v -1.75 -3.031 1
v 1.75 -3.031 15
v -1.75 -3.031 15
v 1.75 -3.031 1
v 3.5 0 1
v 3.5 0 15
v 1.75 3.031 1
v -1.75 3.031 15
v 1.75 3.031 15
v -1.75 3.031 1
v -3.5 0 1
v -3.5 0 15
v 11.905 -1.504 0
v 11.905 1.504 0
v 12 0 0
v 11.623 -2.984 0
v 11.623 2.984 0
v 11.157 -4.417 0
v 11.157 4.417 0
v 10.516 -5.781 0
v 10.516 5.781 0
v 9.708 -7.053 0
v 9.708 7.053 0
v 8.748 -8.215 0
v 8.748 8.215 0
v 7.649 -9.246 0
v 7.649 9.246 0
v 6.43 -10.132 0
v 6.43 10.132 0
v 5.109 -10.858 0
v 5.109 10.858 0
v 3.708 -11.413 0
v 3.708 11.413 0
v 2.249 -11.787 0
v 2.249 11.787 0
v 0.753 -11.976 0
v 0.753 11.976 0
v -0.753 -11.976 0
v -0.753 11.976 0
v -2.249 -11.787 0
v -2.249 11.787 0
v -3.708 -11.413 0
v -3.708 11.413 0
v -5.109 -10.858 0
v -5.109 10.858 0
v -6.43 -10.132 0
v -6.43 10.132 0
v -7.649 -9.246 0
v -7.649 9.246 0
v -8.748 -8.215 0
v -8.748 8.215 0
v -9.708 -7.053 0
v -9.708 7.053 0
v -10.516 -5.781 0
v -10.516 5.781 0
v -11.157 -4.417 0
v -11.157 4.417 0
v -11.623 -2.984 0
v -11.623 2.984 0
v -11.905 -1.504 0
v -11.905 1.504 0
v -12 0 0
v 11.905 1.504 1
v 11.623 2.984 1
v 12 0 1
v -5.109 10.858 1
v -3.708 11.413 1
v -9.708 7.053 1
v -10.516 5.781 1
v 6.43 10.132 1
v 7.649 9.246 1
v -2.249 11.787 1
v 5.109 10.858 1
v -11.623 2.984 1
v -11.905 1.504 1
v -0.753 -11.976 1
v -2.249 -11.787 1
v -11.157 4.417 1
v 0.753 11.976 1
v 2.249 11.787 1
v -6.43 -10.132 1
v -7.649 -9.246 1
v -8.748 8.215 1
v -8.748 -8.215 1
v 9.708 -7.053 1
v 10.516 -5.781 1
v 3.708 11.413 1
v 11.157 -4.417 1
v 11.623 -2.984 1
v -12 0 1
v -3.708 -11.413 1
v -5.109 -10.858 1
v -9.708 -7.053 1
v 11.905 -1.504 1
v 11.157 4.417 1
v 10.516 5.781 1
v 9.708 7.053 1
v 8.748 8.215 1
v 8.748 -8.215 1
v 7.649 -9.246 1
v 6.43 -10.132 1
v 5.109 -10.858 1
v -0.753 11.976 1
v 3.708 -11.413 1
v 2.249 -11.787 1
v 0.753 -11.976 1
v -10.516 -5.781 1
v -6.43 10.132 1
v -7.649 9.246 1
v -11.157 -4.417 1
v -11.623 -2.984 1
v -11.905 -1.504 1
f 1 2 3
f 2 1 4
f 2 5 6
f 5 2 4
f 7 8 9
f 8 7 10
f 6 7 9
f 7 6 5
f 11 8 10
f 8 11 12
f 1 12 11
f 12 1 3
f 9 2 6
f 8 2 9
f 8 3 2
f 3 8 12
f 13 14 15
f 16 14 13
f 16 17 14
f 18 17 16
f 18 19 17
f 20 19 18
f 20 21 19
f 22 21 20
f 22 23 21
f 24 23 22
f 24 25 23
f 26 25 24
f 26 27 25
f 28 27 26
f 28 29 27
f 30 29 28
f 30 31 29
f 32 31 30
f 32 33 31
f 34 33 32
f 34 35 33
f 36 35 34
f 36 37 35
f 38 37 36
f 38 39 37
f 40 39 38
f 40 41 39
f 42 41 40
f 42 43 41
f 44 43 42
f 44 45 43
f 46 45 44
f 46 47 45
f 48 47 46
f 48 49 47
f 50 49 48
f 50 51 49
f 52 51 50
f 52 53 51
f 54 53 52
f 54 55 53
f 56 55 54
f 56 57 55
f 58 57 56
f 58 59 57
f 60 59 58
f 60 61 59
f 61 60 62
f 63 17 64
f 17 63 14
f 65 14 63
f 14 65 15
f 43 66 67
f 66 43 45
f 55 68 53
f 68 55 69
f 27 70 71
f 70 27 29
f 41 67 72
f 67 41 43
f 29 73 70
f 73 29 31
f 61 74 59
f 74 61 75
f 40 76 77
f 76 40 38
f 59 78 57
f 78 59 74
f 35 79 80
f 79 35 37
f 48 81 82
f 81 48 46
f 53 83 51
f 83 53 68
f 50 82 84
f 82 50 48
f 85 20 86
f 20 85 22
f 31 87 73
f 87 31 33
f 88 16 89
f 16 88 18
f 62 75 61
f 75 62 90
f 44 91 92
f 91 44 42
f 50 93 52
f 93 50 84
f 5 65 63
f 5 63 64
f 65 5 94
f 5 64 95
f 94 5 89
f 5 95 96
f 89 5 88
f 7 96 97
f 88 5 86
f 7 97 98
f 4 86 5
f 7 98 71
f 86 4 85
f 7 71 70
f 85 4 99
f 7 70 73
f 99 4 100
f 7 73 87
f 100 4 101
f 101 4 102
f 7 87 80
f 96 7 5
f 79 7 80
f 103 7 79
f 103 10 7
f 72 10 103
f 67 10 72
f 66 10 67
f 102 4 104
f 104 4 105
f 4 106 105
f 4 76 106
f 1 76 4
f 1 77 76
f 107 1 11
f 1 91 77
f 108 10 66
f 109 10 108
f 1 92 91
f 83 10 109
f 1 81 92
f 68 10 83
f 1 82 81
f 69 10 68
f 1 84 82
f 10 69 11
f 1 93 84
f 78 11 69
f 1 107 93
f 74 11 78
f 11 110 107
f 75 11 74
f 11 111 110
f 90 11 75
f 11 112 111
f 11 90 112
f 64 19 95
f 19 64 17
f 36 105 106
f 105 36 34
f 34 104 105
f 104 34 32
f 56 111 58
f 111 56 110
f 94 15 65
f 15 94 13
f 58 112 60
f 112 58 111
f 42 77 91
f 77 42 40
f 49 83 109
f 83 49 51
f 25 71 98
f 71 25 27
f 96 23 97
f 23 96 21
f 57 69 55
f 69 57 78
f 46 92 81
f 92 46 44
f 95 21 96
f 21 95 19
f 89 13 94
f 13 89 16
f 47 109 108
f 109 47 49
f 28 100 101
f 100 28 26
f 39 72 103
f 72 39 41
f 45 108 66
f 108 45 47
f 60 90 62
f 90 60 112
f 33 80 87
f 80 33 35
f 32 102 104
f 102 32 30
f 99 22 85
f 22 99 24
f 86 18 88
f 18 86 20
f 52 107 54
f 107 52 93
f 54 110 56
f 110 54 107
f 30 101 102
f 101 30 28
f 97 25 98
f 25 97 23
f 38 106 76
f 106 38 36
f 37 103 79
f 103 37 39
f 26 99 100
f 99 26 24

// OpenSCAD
module key() {
    $fn = 6;
    cylinder(15, 3.5, 3.5);
}

module base() {
    $fn = 50;
    cylinder(1, 12, 12);
}

key();
base();
